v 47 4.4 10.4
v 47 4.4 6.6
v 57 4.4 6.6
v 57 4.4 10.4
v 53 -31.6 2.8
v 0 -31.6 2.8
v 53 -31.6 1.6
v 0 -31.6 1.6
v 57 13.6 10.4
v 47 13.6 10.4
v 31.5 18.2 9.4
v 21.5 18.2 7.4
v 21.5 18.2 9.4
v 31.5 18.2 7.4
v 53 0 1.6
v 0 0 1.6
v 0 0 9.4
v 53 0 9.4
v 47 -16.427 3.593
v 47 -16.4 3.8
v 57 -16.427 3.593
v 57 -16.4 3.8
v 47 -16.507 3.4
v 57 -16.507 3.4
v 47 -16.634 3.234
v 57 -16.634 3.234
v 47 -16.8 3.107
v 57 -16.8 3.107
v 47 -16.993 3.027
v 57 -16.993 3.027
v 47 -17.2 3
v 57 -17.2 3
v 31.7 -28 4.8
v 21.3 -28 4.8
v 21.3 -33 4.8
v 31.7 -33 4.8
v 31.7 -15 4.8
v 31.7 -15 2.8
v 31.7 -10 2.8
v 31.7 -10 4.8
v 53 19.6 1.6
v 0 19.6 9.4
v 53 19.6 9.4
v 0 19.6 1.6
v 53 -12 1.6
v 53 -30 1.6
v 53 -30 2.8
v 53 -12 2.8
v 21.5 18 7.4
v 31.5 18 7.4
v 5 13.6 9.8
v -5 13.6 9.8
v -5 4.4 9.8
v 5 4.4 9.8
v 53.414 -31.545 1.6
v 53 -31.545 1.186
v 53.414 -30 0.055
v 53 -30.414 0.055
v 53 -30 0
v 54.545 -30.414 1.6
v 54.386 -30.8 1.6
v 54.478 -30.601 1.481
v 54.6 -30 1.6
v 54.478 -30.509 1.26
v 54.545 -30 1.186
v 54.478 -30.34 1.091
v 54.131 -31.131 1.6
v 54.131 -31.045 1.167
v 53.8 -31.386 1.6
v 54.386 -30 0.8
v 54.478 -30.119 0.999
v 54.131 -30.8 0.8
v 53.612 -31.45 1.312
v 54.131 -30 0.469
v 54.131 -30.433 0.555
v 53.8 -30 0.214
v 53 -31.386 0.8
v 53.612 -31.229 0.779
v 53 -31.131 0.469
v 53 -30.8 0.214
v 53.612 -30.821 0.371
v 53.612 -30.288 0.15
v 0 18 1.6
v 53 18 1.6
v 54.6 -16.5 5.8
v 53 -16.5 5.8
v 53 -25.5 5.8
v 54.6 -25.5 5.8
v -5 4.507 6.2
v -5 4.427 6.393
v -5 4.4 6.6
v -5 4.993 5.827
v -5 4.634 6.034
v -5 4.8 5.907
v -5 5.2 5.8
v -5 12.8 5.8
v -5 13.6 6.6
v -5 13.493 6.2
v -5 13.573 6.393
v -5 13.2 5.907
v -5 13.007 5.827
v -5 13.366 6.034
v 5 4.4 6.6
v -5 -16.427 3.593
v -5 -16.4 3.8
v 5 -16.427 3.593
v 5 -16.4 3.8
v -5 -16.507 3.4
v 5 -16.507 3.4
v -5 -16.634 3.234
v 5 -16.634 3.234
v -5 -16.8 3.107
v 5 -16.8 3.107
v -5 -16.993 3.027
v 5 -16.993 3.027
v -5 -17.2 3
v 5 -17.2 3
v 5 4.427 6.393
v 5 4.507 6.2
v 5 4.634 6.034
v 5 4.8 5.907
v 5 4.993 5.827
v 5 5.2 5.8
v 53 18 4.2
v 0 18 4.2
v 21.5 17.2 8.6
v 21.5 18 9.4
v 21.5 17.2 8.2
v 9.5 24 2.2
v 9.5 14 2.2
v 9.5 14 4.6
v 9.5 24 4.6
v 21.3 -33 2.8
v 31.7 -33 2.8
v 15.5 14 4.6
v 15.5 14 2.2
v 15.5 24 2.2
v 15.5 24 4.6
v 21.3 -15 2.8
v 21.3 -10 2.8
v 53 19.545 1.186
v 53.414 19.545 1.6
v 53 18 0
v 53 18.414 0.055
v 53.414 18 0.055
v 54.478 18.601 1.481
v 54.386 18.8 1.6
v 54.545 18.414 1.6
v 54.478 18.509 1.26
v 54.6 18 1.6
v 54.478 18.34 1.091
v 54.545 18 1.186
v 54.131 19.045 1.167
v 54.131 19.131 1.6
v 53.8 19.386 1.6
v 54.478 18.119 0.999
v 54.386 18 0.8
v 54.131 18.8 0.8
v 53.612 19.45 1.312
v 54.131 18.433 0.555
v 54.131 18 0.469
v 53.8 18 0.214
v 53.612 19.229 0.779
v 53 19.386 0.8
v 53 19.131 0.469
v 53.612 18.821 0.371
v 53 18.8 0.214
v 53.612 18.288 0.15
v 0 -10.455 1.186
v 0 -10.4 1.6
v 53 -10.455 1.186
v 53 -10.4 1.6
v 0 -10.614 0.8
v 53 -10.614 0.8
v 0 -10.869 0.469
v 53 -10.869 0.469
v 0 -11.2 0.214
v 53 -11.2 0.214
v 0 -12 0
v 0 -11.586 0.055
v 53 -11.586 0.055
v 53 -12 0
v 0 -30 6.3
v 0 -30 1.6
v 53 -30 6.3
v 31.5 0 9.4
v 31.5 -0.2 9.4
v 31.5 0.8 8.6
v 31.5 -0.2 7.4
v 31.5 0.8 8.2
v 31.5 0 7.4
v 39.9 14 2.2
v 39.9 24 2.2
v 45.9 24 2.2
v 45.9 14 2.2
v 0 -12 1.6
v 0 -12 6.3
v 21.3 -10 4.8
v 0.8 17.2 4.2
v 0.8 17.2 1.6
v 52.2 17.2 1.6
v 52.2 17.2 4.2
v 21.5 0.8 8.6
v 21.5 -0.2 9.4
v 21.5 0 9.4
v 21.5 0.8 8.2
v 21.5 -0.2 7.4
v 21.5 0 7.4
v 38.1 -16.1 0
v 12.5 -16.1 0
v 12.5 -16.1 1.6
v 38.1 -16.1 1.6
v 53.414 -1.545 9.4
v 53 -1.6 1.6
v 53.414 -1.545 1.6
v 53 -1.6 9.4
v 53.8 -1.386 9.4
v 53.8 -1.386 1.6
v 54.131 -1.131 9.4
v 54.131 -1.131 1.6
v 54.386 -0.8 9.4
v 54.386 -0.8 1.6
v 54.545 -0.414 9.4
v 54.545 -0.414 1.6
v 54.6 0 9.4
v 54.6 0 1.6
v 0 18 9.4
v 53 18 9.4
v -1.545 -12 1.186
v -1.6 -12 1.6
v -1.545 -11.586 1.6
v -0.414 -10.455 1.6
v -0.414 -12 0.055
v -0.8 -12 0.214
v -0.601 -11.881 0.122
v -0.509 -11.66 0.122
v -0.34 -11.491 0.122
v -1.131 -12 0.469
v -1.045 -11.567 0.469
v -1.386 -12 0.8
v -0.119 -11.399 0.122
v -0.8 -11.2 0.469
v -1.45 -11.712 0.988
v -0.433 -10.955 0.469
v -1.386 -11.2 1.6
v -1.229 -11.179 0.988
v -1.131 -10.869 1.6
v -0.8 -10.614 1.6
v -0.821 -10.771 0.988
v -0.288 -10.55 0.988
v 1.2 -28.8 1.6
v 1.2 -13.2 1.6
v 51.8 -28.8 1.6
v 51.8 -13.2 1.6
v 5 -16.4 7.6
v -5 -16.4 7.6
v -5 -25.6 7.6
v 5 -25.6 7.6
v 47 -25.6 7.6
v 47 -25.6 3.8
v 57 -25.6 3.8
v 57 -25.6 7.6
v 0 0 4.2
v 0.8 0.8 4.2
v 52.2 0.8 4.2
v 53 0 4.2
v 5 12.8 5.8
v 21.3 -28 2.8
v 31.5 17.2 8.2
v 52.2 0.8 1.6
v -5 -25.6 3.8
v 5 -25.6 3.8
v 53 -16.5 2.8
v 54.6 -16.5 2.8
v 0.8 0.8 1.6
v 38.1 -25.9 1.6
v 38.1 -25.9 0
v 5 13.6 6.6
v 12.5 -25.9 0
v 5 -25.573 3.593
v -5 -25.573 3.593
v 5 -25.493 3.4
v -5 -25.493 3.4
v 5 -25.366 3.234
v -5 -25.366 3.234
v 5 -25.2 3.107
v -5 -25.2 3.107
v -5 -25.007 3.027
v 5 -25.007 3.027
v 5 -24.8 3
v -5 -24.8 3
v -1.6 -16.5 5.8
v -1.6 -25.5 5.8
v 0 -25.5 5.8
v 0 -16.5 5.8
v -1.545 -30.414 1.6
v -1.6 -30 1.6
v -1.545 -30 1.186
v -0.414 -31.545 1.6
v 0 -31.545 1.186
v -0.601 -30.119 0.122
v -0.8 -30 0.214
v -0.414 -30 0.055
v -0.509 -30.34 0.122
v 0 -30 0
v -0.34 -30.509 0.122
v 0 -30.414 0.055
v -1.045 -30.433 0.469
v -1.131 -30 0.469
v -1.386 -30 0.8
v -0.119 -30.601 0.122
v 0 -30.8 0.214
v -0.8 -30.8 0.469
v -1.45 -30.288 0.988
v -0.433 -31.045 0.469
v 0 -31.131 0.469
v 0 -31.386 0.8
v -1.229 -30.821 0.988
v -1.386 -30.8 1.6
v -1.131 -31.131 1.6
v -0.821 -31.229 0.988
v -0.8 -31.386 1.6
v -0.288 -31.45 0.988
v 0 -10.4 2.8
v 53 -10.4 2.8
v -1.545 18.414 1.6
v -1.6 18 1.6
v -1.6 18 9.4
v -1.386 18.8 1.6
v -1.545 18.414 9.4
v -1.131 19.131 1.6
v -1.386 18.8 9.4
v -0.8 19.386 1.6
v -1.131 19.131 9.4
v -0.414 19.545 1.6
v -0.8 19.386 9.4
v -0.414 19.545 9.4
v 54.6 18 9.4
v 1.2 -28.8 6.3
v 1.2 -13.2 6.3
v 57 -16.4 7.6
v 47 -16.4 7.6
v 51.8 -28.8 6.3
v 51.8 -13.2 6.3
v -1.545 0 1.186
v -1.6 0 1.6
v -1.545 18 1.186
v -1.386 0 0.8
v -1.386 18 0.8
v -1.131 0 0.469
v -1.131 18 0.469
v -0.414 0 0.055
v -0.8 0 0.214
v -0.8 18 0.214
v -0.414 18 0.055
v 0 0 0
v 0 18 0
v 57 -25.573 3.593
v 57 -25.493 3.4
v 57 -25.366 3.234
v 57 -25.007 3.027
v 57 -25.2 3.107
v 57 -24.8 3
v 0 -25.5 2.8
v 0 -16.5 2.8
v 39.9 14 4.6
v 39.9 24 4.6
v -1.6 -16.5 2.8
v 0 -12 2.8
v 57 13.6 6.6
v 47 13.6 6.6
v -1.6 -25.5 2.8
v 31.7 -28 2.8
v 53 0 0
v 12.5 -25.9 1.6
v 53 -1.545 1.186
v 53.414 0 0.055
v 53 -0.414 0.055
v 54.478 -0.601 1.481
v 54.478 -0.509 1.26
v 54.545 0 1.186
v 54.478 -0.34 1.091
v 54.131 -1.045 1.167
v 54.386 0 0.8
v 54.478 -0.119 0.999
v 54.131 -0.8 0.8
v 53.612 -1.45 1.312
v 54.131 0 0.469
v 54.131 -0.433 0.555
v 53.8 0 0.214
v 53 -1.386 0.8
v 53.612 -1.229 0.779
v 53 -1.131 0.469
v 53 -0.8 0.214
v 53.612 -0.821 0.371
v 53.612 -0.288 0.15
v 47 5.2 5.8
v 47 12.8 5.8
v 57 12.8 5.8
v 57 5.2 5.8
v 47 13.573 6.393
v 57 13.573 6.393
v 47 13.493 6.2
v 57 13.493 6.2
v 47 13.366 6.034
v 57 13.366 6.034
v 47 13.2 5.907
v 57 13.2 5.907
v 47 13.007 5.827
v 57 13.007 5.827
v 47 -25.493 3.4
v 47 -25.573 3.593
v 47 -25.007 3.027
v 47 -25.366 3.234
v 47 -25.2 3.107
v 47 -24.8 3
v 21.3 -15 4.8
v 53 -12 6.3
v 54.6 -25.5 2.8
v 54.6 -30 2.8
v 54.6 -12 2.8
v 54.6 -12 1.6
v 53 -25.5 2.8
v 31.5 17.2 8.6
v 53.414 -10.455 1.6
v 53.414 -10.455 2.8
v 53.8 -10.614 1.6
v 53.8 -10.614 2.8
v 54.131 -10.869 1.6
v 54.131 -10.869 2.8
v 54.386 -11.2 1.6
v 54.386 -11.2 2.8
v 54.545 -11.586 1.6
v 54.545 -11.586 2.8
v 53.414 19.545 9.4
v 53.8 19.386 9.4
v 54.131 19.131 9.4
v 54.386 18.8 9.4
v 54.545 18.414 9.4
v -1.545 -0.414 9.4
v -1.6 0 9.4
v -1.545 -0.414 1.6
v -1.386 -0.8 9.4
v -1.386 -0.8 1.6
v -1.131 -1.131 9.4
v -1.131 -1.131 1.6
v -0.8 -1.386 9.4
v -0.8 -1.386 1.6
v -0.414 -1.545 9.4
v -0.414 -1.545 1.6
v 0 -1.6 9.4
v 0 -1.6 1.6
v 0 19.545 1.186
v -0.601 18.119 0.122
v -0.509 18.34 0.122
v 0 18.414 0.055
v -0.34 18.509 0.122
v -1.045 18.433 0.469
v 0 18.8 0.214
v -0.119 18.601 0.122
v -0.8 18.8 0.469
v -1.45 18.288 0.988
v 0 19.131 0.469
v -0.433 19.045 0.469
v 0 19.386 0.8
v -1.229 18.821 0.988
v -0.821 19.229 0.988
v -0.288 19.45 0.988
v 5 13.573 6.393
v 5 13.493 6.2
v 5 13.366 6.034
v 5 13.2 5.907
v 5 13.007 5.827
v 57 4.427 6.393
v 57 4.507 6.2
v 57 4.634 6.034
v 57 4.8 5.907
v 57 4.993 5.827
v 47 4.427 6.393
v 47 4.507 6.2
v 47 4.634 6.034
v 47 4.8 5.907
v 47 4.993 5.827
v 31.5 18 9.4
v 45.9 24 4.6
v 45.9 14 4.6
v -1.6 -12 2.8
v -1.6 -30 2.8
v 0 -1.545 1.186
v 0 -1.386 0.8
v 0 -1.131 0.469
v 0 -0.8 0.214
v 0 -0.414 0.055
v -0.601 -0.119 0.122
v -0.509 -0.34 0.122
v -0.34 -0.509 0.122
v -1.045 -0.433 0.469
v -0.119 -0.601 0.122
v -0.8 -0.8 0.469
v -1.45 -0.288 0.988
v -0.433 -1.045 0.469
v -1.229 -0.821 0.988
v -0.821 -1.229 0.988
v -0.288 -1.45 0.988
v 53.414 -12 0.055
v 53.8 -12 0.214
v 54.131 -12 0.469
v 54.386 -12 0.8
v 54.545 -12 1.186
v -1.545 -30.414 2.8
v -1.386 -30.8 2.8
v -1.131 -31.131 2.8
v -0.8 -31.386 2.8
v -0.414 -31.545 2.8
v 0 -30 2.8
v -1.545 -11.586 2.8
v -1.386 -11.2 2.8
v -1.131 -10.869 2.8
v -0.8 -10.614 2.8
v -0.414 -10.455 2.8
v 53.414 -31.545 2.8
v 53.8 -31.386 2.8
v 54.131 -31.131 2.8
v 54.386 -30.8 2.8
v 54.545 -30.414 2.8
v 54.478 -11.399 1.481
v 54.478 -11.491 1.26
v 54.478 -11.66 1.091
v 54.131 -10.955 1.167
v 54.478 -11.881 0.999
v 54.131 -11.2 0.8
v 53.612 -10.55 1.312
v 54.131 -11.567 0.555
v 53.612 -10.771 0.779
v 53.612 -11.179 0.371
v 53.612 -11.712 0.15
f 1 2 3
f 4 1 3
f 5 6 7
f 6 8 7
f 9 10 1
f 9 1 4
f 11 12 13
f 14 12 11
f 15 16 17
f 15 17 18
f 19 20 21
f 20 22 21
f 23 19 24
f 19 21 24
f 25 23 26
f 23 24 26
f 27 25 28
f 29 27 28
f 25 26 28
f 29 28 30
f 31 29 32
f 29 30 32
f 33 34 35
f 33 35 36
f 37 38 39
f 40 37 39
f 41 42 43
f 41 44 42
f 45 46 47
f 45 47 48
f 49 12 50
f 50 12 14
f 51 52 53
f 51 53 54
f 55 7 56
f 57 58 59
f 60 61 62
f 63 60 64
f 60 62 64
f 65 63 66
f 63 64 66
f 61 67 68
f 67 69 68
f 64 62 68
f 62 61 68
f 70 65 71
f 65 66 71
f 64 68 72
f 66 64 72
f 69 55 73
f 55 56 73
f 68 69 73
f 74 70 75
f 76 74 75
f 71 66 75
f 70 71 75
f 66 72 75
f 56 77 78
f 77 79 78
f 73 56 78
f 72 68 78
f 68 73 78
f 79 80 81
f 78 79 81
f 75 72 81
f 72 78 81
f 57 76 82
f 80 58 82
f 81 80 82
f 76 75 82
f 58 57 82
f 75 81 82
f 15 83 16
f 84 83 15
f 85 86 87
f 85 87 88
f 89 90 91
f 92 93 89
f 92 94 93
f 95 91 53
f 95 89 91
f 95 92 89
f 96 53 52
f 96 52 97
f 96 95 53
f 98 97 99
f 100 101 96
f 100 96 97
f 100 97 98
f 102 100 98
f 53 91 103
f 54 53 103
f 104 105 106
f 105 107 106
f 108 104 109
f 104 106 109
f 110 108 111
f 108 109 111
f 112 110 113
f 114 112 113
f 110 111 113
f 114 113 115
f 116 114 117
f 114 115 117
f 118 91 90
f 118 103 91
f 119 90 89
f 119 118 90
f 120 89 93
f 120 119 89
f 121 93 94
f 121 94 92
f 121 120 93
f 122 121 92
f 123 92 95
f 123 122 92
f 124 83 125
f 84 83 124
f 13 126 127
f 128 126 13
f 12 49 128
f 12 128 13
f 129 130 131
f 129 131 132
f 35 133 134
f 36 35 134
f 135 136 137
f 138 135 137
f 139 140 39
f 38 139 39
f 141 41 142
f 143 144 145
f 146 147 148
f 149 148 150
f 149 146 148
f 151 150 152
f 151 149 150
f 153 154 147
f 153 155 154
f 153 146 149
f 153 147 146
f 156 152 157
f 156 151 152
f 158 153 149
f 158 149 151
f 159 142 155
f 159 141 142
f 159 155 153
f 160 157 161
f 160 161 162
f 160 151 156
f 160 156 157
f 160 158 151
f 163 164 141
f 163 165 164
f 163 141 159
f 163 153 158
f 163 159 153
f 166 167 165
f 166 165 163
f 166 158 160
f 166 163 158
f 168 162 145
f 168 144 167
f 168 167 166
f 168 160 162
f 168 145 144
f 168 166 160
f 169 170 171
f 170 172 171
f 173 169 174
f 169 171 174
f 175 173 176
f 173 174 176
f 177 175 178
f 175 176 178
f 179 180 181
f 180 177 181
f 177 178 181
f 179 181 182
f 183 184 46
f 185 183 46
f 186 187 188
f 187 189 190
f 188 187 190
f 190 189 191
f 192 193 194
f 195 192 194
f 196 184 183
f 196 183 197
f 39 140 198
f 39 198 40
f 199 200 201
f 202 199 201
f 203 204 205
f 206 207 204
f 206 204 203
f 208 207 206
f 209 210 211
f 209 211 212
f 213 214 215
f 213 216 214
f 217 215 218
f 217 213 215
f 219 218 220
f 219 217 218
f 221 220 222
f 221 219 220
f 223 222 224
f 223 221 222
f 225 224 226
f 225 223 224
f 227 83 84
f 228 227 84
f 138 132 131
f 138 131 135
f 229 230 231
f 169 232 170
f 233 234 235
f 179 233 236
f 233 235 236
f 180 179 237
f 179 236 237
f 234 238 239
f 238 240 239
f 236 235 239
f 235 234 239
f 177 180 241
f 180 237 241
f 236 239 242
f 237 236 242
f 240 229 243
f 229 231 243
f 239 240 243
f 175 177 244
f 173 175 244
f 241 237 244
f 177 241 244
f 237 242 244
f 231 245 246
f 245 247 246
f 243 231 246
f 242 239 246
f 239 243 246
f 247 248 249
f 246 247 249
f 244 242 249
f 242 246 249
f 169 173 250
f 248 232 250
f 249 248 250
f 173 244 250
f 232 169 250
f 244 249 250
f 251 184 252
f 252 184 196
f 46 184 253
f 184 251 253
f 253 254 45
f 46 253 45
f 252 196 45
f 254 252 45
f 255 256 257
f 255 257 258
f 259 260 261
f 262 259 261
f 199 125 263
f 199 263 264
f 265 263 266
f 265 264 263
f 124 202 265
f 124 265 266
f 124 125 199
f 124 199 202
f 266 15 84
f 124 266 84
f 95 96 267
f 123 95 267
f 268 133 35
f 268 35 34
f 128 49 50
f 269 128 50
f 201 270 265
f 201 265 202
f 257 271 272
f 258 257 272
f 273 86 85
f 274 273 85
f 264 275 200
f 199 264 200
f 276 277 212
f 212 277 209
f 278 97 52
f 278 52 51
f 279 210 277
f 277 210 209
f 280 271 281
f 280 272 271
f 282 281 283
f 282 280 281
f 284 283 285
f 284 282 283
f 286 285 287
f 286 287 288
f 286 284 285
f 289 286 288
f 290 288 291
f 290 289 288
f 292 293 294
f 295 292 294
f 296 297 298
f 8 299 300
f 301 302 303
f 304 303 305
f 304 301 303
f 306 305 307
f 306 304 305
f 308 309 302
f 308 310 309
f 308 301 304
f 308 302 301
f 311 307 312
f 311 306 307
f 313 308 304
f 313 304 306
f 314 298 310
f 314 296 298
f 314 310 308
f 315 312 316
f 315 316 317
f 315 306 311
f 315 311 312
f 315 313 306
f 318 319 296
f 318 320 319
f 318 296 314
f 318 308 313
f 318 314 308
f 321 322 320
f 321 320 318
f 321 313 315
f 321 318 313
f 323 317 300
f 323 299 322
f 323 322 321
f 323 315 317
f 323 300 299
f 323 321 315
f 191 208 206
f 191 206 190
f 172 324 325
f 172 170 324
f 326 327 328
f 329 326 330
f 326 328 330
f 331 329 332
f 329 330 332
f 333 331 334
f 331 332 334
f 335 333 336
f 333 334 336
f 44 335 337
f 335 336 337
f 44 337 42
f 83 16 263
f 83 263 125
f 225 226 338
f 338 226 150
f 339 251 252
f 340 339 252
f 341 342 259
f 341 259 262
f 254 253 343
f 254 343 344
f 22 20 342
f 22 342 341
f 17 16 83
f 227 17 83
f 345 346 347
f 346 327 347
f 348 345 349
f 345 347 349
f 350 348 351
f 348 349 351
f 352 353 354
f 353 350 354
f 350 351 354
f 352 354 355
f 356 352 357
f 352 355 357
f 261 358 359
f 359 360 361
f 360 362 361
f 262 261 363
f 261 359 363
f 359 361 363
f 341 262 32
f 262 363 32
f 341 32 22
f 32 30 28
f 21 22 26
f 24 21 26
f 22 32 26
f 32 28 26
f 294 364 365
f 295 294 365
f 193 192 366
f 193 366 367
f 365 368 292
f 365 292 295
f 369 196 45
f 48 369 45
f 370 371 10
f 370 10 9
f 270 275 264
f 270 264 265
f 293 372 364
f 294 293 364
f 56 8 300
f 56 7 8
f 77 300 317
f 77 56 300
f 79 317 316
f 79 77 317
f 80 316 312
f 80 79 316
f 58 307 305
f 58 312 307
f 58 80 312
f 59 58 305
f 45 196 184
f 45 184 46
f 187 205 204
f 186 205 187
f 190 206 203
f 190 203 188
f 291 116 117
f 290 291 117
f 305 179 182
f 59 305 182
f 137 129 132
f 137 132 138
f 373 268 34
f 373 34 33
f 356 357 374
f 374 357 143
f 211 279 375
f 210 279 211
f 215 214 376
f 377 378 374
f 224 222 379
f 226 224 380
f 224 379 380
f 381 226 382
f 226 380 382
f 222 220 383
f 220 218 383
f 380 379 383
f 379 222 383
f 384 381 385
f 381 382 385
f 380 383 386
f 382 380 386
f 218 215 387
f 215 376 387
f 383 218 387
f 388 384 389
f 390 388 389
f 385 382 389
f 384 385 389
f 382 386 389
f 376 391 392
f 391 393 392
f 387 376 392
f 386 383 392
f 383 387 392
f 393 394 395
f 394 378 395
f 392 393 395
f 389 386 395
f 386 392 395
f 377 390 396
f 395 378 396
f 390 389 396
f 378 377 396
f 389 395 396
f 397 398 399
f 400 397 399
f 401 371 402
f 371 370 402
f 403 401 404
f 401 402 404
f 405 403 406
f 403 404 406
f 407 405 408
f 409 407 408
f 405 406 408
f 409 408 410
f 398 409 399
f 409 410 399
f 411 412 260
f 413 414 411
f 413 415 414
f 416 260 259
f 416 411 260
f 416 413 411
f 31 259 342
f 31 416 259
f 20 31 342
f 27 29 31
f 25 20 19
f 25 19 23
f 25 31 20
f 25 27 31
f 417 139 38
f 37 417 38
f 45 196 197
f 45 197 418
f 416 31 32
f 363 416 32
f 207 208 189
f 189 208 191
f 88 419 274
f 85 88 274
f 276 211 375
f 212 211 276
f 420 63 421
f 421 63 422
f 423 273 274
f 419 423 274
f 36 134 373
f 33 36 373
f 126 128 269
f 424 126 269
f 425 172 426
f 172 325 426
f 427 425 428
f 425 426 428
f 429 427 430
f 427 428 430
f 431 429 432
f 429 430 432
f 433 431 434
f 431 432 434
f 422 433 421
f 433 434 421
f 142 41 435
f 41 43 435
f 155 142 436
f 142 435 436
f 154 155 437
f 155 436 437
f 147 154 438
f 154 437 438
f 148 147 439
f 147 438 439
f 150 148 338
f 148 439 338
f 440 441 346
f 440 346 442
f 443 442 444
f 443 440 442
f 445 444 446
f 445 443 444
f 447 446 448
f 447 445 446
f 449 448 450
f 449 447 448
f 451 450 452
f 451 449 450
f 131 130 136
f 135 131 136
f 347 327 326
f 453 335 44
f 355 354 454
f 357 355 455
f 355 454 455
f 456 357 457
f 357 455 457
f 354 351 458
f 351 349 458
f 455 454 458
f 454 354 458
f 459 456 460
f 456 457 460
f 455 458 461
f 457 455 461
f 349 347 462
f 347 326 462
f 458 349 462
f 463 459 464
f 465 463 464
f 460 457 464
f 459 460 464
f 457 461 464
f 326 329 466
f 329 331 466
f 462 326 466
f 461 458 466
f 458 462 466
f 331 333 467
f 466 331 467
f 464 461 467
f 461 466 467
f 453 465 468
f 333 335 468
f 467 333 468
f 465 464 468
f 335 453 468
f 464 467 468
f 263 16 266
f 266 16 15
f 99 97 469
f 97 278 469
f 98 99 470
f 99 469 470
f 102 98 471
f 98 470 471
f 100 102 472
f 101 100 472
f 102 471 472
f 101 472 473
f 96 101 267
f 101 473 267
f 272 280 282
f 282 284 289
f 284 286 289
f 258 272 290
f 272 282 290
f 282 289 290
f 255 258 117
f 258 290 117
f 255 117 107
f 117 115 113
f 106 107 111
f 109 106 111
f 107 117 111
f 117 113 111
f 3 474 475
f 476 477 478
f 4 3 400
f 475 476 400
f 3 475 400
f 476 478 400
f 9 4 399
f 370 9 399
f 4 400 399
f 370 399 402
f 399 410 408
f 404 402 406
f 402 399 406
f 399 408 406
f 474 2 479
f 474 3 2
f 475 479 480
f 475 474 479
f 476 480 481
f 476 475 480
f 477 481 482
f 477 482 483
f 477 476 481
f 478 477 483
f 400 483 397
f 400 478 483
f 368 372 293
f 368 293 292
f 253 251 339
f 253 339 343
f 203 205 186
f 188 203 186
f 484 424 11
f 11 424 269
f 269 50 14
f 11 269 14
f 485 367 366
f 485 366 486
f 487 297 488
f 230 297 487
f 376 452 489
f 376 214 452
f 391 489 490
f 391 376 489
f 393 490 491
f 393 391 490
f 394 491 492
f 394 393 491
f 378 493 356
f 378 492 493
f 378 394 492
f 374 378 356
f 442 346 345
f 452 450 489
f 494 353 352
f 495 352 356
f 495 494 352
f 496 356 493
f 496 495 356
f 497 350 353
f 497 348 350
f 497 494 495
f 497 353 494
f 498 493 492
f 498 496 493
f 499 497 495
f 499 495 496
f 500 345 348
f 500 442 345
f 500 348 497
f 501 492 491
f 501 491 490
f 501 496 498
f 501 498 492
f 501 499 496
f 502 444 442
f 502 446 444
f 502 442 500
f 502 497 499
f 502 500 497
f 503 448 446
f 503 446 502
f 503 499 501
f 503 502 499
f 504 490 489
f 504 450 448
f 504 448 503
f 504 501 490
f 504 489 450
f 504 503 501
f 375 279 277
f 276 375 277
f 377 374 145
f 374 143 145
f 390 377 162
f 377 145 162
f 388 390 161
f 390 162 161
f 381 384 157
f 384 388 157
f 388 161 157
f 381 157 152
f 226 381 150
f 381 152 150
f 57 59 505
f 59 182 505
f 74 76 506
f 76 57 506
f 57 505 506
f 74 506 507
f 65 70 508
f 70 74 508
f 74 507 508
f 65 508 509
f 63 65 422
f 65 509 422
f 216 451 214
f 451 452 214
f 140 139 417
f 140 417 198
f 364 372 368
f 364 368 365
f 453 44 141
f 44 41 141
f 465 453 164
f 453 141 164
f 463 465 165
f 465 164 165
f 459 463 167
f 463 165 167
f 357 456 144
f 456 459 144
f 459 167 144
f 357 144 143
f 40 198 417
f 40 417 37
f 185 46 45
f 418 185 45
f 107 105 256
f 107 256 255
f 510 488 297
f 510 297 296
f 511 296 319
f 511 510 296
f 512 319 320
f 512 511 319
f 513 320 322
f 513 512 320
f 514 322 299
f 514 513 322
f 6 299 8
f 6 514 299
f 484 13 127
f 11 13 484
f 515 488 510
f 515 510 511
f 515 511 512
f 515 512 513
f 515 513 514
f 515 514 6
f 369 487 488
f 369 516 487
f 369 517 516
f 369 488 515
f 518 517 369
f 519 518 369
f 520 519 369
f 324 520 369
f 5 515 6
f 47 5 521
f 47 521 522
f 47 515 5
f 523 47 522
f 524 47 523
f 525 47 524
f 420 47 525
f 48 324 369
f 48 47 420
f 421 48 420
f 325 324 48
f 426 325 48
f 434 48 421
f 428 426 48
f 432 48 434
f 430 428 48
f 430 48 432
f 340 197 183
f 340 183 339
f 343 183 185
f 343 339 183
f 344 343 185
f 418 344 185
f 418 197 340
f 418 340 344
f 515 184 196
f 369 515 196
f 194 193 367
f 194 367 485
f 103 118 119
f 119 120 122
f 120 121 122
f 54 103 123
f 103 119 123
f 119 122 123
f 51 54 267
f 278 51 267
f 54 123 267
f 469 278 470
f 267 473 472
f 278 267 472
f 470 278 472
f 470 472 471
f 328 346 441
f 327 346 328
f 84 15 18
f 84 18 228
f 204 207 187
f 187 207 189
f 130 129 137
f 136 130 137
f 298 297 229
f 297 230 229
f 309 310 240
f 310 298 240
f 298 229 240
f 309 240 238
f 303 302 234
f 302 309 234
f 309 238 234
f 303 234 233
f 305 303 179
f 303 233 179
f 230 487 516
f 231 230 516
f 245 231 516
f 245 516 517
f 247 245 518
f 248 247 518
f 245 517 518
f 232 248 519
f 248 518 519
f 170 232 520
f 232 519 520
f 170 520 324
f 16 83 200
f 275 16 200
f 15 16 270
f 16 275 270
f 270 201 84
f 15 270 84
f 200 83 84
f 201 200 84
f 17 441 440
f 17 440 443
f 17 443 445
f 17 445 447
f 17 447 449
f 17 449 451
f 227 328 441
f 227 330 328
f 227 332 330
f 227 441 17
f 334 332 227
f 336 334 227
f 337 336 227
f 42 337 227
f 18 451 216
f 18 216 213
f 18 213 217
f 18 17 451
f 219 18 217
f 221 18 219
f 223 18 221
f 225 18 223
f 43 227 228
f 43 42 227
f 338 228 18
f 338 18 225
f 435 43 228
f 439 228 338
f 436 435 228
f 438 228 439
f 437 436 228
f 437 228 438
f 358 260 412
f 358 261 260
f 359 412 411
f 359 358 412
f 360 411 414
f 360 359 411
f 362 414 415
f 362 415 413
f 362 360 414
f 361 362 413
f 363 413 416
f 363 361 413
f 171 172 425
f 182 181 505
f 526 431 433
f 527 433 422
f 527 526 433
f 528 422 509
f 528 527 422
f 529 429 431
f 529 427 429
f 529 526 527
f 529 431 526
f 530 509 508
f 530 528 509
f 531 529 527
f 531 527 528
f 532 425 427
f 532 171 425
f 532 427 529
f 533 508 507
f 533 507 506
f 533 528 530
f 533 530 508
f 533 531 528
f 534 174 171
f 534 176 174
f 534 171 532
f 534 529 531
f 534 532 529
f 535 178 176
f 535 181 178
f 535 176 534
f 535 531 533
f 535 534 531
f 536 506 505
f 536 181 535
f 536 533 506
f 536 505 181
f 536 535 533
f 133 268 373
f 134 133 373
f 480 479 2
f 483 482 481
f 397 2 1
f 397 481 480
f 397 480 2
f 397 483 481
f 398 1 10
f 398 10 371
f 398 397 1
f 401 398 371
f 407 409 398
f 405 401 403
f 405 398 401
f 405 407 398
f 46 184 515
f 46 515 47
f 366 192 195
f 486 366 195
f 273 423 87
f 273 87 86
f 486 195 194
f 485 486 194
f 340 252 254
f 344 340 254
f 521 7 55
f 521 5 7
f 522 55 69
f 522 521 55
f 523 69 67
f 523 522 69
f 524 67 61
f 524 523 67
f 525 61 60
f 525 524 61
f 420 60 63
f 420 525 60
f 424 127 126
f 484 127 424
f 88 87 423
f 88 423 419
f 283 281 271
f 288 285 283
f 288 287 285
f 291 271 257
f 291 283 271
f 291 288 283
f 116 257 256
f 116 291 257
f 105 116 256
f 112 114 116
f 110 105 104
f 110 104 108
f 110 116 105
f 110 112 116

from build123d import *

# Parameters (mm, degrees)
BOX001_W        = 53
BOX001_H        = 18
BOX001_DEPTH    = 9.4
BOX_W           = 56.2
BOX_H           = 21.2
BOX_DEPTH       = 9.4
FILLET_R        = 1.6
BOX003_W        = 51.4
BOX003_H        = 16.4
BOX003_DEPTH    = 2.6
BOX002_W        = 53
BOX002_H        = 18
BOX002_DEPTH    = 2.6
BOX004_W        = 10
BOX004_H        = 1
BOX004_DEPTH    = 2
CHAMFER_SIZE    = 0.8
BOX005_W        = 10
BOX005_H        = 1
BOX005_DEPTH    = 2
CHAMFER001_SIZE = 0.8
BOX008_W        = 6
BOX008_H        = 10
BOX008_DEPTH    = 2.4
BOX009_W        = 6
BOX009_H        = 10
BOX009_DEPTH    = 2.4
BOX011_W        = 53
BOX011_H        = 18
BOX011_DEPTH    = 9.4
BOX010_W        = 56.2
BOX010_H        = 21.2
BOX010_DEPTH    = 2.8
FILLET001_R     = 1.6
BOX013_W        = 50.6
BOX013_H        = 15.6
BOX013_DEPTH    = 4.8
BOX012_W        = 53
BOX012_H        = 18
BOX012_DEPTH    = 4.7
BOX014_W        = 25.6
BOX014_H        = 9.8
BOX014_DEPTH    = 1.6
BOX017_W        = 10.4
BOX017_H        = 5
BOX017_DEPTH    = 2
BOX018_W        = 10.4
BOX018_H        = 5
BOX018_DEPTH    = 2
BOX006_W        = 10
BOX006_H        = 9.2
BOX006_DEPTH    = 4
FILLET002_R     = 0.8
BOX019_W        = 10
BOX019_H        = 9.2
BOX019_DEPTH    = 4.6
FILLET003_R     = 0.8
BOX022_W        = 1.6
BOX022_H        = 9
BOX022_DEPTH    = 3
BOX023_W        = 1.6
BOX023_H        = 9
BOX023_DEPTH    = 3
BOX020_W        = 10
BOX020_H        = 9.2
BOX020_DEPTH    = 4.6
FILLET004_R     = 0.8
BOX021_W        = 10
BOX021_H        = 9.2
BOX021_DEPTH    = 4.6
FILLET005_R     = 0.8


with BuildPart() as unten_innen:
    # Box001 → Box001 (new body)
    with BuildSketch(Plane.XY.offset(1.6)):
        with Locations((26.5, 9)):
            Rectangle(BOX001_W, BOX001_H)
    extrude(amount=BOX001_DEPTH)


with BuildPart() as schale_unten:
    # Box → Box (new body)
    with BuildSketch(Plane(origin=(-1.6, -1.6, 0), x_dir=(1, 0, 0), z_dir=(0, 0, 1))):
        with Locations((28.1, 10.6)):
            Rectangle(BOX_W, BOX_H)
    extrude(amount=BOX_DEPTH)

    # Cut: cut unten_innen
    add(unten_innen.part, mode=Mode.SUBTRACT)

    # Fillet
    fillet_edges = [schale_unten.edges().sort_by_distance(p)[0] for p in [
        (-1.6, -1.6, 4.7),
        (-1.6, 19.6, 4.7),
        (-1.6, 9, 0),
        (26.5, -1.6, 0),
        (54.6, -1.6, 4.7),
        (26.5, 19.6, 0),
        (54.6, 19.6, 4.7),
        (54.6, 9, 0),
    ]]
    fillet(fillet_edges, radius=FILLET_R)


with BuildPart() as auflage_innen:
    # Box003 → Box003 (new body)
    with BuildSketch(Plane(origin=(0.8, 0.8, 1.6), x_dir=(1, 0, 0), z_dir=(0, 0, 1))):
        with Locations((25.7, 8.2)):
            Rectangle(BOX003_W, BOX003_H)
    extrude(amount=BOX003_DEPTH)


with BuildPart() as auflage:
    # Box002 → Box002 (new body)
    with BuildSketch(Plane.XY.offset(1.6)):
        with Locations((26.5, 9)):
            Rectangle(BOX002_W, BOX002_H)
    extrude(amount=BOX002_DEPTH)

    # Cut001: cut Auflage_innen
    add(auflage_innen.part, mode=Mode.SUBTRACT)


with BuildPart() as haken1:
    # Box004 → Box004 (new body)
    with BuildSketch(Plane(origin=(21.5, -0.2, 7.4), x_dir=(1, 0, 0), z_dir=(0, 0, 1))):
        with Locations((5, 0.5)):
            Rectangle(BOX004_W, BOX004_H)
    extrude(amount=BOX004_DEPTH)

    # Chamfer
    chamfer_edges = [haken1.edges().sort_by_distance(p)[0] for p in [
        (26.5, 0.8, 7.4),
        (26.5, 0.8, 9.4),
    ]]
    chamfer(chamfer_edges, length=CHAMFER_SIZE)


with BuildPart() as haken2:
    # Box005 → Box005 (new body)
    with BuildSketch(Plane(origin=(21.5, 17.2, 7.4), x_dir=(1, 0, 0), z_dir=(0, 0, 1))):
        with Locations((5, 0.5)):
            Rectangle(BOX005_W, BOX005_H)
    extrude(amount=BOX005_DEPTH)

    # Chamfer001
    chamfer001_edges = [haken2.edges().sort_by_distance(p)[0] for p in [
        (26.5, 17.2, 7.4),
        (26.5, 17.2, 9.4),
    ]]
    chamfer(chamfer001_edges, length=CHAMFER001_SIZE)


with BuildPart() as button1:
    # Box008 → Box008 (new body)
    with BuildSketch(Plane(origin=(9.5, 14, 2.2), x_dir=(1, 0, 0), z_dir=(0, 0, 1))):
        with Locations((3, 5)):
            Rectangle(BOX008_W, BOX008_H)
    extrude(amount=BOX008_DEPTH)


with BuildPart() as button2:
    # Box009 → Box009 (new body)
    with BuildSketch(Plane(origin=(39.9, 14, 2.2), x_dir=(1, 0, 0), z_dir=(0, 0, 1))):
        with Locations((3, 5)):
            Rectangle(BOX009_W, BOX009_H)
    extrude(amount=BOX009_DEPTH)


with BuildPart() as oben_innen:
    # Box011 → Box011 (new body)
    with BuildSketch(Plane(origin=(0, -30, 1.6), x_dir=(1, 0, 0), z_dir=(0, 0, 1))):
        with Locations((26.5, 9)):
            Rectangle(BOX011_W, BOX011_H)
    extrude(amount=BOX011_DEPTH)


with BuildPart() as schale_oben:
    # Box010 → Box010 (new body)
    with BuildSketch(Plane(origin=(-1.6, -31.6, 0), x_dir=(1, 0, 0), z_dir=(0, 0, 1))):
        with Locations((28.1, 10.6)):
            Rectangle(BOX010_W, BOX010_H)
    extrude(amount=BOX010_DEPTH)

    # Cut002: cut oben_innen
    add(oben_innen.part, mode=Mode.SUBTRACT)

    # Fillet001
    fillet001_edges = [schale_oben.edges().sort_by_distance(p)[0] for p in [
        (-1.6, -31.6, 1.4),
        (-1.6, -10.4, 1.4),
        (-1.6, -21, 0),
        (26.5, -31.6, 0),
        (54.6, -31.6, 1.4),
        (26.5, -10.4, 0),
        (54.6, -10.4, 1.4),
        (54.6, -21, 0),
    ]]
    fillet(fillet001_edges, radius=FILLET001_R)


with BuildPart() as rahmen_innen:
    # Box013 → Box013 (new body)
    with BuildSketch(Plane(origin=(1.2, -28.8, 1.6), x_dir=(1, 0, 0), z_dir=(0, 0, 1))):
        with Locations((25.3, 7.8)):
            Rectangle(BOX013_W, BOX013_H)
    extrude(amount=BOX013_DEPTH)


with BuildPart() as rahmen:
    # Box012 → Box012 (new body)
    with BuildSketch(Plane(origin=(0, -30, 1.6), x_dir=(1, 0, 0), z_dir=(0, 0, 1))):
        with Locations((26.5, 9)):
            Rectangle(BOX012_W, BOX012_H)
    extrude(amount=BOX012_DEPTH)

    # Cut003: cut Rahmen_innen
    add(rahmen_innen.part, mode=Mode.SUBTRACT)


with BuildPart() as oled:
    # Box014 → Box014 (new body)
    with BuildSketch(Plane(origin=(12.5, -25.9, 0), x_dir=(1, 0, 0), z_dir=(0, 0, 1))):
        with Locations((12.8, 4.9)):
            Rectangle(BOX014_W, BOX014_H)
    extrude(amount=BOX014_DEPTH)


with BuildPart() as oese1:
    # Box017 → Box017 (new body)
    with BuildSketch(Plane(origin=(21.3, -33, 2.8), x_dir=(1, 0, 0), z_dir=(0, 0, 1))):
        with Locations((5.2, 2.5)):
            Rectangle(BOX017_W, BOX017_H)
    extrude(amount=BOX017_DEPTH)


with BuildPart() as oese2:
    # Box018 → Box018 (new body)
    with BuildSketch(Plane(origin=(21.3, -15, 2.8), x_dir=(1, 0, 0), z_dir=(0, 0, 1))):
        with Locations((5.2, 2.5)):
            Rectangle(BOX018_W, BOX018_H)
    extrude(amount=BOX018_DEPTH)


with BuildPart() as usb_buchse1:
    # Box006 → Box006 (new body)
    with BuildSketch(Plane(origin=(-5, 4.4, 5.8), x_dir=(1, 0, 0), z_dir=(0, 0, 1))):
        with Locations((5, 4.6)):
            Rectangle(BOX006_W, BOX006_H)
    extrude(amount=BOX006_DEPTH)

    # Fillet002
    fillet002_edges = [usb_buchse1.edges().sort_by_distance(p)[0] for p in [
        (0, 4.4, 5.8),
        (0, 13.6, 5.8),
    ]]
    fillet(fillet002_edges, radius=FILLET002_R)


with BuildPart() as usb_buchse2:
    # Box019 → Box019 (new body)
    with BuildSketch(Plane(origin=(47, 4.4, 5.8), x_dir=(1, 0, 0), z_dir=(0, 0, 1))):
        with Locations((5, 4.6)):
            Rectangle(BOX019_W, BOX019_H)
    extrude(amount=BOX019_DEPTH)

    # Fillet003
    fillet003_edges = [usb_buchse2.edges().sort_by_distance(p)[0] for p in [
        (52, 4.4, 5.8),
        (52, 13.6, 5.8),
    ]]
    fillet(fillet003_edges, radius=FILLET003_R)


with BuildPart() as nut1:
    # Box022 → Box022 (new body)
    with BuildSketch(Plane(origin=(-1.6, -25.5, 2.8), x_dir=(1, 0, 0), z_dir=(0, 0, 1))):
        with Locations((0.8, 4.5)):
            Rectangle(BOX022_W, BOX022_H)
    extrude(amount=BOX022_DEPTH)


with BuildPart() as nut2:
    # Box023 → Box023 (new body)
    with BuildSketch(Plane(origin=(53, -25.5, 2.8), x_dir=(1, 0, 0), z_dir=(0, 0, 1))):
        with Locations((0.8, 4.5)):
            Rectangle(BOX023_W, BOX023_H)
    extrude(amount=BOX023_DEPTH)


with BuildPart() as usb_buchse3:
    # Box020 → Box020 (new body)
    with BuildSketch(Plane(origin=(-5, -25.6, 3), x_dir=(1, 0, 0), z_dir=(0, 0, 1))):
        with Locations((5, 4.6)):
            Rectangle(BOX020_W, BOX020_H)
    extrude(amount=BOX020_DEPTH)

    # Fillet004
    fillet004_edges = [usb_buchse3.edges().sort_by_distance(p)[0] for p in [
        (0, -25.6, 3),
        (0, -16.4, 3),
    ]]
    fillet(fillet004_edges, radius=FILLET004_R)


with BuildPart() as usb_buchse4:
    # Box021 → Box021 (new body)
    with BuildSketch(Plane(origin=(47, -25.6, 3), x_dir=(1, 0, 0), z_dir=(0, 0, 1))):
        with Locations((5, 4.6)):
            Rectangle(BOX021_W, BOX021_H)
    extrude(amount=BOX021_DEPTH)

    # Fillet005
    fillet005_edges = [usb_buchse4.edges().sort_by_distance(p)[0] for p in [
        (52, -25.6, 3),
        (52, -16.4, 3),
    ]]
    fillet(fillet005_edges, radius=FILLET005_R)


solid = Compound([schale_unten.part, auflage.part, haken1.part, haken2.part, button1.part, button2.part, schale_oben.part, rahmen.part, oled.part, oese1.part, oese2.part, usb_buchse1.part, usb_buchse2.part, nut1.part, nut2.part, usb_buchse3.part, usb_buchse4.part])
